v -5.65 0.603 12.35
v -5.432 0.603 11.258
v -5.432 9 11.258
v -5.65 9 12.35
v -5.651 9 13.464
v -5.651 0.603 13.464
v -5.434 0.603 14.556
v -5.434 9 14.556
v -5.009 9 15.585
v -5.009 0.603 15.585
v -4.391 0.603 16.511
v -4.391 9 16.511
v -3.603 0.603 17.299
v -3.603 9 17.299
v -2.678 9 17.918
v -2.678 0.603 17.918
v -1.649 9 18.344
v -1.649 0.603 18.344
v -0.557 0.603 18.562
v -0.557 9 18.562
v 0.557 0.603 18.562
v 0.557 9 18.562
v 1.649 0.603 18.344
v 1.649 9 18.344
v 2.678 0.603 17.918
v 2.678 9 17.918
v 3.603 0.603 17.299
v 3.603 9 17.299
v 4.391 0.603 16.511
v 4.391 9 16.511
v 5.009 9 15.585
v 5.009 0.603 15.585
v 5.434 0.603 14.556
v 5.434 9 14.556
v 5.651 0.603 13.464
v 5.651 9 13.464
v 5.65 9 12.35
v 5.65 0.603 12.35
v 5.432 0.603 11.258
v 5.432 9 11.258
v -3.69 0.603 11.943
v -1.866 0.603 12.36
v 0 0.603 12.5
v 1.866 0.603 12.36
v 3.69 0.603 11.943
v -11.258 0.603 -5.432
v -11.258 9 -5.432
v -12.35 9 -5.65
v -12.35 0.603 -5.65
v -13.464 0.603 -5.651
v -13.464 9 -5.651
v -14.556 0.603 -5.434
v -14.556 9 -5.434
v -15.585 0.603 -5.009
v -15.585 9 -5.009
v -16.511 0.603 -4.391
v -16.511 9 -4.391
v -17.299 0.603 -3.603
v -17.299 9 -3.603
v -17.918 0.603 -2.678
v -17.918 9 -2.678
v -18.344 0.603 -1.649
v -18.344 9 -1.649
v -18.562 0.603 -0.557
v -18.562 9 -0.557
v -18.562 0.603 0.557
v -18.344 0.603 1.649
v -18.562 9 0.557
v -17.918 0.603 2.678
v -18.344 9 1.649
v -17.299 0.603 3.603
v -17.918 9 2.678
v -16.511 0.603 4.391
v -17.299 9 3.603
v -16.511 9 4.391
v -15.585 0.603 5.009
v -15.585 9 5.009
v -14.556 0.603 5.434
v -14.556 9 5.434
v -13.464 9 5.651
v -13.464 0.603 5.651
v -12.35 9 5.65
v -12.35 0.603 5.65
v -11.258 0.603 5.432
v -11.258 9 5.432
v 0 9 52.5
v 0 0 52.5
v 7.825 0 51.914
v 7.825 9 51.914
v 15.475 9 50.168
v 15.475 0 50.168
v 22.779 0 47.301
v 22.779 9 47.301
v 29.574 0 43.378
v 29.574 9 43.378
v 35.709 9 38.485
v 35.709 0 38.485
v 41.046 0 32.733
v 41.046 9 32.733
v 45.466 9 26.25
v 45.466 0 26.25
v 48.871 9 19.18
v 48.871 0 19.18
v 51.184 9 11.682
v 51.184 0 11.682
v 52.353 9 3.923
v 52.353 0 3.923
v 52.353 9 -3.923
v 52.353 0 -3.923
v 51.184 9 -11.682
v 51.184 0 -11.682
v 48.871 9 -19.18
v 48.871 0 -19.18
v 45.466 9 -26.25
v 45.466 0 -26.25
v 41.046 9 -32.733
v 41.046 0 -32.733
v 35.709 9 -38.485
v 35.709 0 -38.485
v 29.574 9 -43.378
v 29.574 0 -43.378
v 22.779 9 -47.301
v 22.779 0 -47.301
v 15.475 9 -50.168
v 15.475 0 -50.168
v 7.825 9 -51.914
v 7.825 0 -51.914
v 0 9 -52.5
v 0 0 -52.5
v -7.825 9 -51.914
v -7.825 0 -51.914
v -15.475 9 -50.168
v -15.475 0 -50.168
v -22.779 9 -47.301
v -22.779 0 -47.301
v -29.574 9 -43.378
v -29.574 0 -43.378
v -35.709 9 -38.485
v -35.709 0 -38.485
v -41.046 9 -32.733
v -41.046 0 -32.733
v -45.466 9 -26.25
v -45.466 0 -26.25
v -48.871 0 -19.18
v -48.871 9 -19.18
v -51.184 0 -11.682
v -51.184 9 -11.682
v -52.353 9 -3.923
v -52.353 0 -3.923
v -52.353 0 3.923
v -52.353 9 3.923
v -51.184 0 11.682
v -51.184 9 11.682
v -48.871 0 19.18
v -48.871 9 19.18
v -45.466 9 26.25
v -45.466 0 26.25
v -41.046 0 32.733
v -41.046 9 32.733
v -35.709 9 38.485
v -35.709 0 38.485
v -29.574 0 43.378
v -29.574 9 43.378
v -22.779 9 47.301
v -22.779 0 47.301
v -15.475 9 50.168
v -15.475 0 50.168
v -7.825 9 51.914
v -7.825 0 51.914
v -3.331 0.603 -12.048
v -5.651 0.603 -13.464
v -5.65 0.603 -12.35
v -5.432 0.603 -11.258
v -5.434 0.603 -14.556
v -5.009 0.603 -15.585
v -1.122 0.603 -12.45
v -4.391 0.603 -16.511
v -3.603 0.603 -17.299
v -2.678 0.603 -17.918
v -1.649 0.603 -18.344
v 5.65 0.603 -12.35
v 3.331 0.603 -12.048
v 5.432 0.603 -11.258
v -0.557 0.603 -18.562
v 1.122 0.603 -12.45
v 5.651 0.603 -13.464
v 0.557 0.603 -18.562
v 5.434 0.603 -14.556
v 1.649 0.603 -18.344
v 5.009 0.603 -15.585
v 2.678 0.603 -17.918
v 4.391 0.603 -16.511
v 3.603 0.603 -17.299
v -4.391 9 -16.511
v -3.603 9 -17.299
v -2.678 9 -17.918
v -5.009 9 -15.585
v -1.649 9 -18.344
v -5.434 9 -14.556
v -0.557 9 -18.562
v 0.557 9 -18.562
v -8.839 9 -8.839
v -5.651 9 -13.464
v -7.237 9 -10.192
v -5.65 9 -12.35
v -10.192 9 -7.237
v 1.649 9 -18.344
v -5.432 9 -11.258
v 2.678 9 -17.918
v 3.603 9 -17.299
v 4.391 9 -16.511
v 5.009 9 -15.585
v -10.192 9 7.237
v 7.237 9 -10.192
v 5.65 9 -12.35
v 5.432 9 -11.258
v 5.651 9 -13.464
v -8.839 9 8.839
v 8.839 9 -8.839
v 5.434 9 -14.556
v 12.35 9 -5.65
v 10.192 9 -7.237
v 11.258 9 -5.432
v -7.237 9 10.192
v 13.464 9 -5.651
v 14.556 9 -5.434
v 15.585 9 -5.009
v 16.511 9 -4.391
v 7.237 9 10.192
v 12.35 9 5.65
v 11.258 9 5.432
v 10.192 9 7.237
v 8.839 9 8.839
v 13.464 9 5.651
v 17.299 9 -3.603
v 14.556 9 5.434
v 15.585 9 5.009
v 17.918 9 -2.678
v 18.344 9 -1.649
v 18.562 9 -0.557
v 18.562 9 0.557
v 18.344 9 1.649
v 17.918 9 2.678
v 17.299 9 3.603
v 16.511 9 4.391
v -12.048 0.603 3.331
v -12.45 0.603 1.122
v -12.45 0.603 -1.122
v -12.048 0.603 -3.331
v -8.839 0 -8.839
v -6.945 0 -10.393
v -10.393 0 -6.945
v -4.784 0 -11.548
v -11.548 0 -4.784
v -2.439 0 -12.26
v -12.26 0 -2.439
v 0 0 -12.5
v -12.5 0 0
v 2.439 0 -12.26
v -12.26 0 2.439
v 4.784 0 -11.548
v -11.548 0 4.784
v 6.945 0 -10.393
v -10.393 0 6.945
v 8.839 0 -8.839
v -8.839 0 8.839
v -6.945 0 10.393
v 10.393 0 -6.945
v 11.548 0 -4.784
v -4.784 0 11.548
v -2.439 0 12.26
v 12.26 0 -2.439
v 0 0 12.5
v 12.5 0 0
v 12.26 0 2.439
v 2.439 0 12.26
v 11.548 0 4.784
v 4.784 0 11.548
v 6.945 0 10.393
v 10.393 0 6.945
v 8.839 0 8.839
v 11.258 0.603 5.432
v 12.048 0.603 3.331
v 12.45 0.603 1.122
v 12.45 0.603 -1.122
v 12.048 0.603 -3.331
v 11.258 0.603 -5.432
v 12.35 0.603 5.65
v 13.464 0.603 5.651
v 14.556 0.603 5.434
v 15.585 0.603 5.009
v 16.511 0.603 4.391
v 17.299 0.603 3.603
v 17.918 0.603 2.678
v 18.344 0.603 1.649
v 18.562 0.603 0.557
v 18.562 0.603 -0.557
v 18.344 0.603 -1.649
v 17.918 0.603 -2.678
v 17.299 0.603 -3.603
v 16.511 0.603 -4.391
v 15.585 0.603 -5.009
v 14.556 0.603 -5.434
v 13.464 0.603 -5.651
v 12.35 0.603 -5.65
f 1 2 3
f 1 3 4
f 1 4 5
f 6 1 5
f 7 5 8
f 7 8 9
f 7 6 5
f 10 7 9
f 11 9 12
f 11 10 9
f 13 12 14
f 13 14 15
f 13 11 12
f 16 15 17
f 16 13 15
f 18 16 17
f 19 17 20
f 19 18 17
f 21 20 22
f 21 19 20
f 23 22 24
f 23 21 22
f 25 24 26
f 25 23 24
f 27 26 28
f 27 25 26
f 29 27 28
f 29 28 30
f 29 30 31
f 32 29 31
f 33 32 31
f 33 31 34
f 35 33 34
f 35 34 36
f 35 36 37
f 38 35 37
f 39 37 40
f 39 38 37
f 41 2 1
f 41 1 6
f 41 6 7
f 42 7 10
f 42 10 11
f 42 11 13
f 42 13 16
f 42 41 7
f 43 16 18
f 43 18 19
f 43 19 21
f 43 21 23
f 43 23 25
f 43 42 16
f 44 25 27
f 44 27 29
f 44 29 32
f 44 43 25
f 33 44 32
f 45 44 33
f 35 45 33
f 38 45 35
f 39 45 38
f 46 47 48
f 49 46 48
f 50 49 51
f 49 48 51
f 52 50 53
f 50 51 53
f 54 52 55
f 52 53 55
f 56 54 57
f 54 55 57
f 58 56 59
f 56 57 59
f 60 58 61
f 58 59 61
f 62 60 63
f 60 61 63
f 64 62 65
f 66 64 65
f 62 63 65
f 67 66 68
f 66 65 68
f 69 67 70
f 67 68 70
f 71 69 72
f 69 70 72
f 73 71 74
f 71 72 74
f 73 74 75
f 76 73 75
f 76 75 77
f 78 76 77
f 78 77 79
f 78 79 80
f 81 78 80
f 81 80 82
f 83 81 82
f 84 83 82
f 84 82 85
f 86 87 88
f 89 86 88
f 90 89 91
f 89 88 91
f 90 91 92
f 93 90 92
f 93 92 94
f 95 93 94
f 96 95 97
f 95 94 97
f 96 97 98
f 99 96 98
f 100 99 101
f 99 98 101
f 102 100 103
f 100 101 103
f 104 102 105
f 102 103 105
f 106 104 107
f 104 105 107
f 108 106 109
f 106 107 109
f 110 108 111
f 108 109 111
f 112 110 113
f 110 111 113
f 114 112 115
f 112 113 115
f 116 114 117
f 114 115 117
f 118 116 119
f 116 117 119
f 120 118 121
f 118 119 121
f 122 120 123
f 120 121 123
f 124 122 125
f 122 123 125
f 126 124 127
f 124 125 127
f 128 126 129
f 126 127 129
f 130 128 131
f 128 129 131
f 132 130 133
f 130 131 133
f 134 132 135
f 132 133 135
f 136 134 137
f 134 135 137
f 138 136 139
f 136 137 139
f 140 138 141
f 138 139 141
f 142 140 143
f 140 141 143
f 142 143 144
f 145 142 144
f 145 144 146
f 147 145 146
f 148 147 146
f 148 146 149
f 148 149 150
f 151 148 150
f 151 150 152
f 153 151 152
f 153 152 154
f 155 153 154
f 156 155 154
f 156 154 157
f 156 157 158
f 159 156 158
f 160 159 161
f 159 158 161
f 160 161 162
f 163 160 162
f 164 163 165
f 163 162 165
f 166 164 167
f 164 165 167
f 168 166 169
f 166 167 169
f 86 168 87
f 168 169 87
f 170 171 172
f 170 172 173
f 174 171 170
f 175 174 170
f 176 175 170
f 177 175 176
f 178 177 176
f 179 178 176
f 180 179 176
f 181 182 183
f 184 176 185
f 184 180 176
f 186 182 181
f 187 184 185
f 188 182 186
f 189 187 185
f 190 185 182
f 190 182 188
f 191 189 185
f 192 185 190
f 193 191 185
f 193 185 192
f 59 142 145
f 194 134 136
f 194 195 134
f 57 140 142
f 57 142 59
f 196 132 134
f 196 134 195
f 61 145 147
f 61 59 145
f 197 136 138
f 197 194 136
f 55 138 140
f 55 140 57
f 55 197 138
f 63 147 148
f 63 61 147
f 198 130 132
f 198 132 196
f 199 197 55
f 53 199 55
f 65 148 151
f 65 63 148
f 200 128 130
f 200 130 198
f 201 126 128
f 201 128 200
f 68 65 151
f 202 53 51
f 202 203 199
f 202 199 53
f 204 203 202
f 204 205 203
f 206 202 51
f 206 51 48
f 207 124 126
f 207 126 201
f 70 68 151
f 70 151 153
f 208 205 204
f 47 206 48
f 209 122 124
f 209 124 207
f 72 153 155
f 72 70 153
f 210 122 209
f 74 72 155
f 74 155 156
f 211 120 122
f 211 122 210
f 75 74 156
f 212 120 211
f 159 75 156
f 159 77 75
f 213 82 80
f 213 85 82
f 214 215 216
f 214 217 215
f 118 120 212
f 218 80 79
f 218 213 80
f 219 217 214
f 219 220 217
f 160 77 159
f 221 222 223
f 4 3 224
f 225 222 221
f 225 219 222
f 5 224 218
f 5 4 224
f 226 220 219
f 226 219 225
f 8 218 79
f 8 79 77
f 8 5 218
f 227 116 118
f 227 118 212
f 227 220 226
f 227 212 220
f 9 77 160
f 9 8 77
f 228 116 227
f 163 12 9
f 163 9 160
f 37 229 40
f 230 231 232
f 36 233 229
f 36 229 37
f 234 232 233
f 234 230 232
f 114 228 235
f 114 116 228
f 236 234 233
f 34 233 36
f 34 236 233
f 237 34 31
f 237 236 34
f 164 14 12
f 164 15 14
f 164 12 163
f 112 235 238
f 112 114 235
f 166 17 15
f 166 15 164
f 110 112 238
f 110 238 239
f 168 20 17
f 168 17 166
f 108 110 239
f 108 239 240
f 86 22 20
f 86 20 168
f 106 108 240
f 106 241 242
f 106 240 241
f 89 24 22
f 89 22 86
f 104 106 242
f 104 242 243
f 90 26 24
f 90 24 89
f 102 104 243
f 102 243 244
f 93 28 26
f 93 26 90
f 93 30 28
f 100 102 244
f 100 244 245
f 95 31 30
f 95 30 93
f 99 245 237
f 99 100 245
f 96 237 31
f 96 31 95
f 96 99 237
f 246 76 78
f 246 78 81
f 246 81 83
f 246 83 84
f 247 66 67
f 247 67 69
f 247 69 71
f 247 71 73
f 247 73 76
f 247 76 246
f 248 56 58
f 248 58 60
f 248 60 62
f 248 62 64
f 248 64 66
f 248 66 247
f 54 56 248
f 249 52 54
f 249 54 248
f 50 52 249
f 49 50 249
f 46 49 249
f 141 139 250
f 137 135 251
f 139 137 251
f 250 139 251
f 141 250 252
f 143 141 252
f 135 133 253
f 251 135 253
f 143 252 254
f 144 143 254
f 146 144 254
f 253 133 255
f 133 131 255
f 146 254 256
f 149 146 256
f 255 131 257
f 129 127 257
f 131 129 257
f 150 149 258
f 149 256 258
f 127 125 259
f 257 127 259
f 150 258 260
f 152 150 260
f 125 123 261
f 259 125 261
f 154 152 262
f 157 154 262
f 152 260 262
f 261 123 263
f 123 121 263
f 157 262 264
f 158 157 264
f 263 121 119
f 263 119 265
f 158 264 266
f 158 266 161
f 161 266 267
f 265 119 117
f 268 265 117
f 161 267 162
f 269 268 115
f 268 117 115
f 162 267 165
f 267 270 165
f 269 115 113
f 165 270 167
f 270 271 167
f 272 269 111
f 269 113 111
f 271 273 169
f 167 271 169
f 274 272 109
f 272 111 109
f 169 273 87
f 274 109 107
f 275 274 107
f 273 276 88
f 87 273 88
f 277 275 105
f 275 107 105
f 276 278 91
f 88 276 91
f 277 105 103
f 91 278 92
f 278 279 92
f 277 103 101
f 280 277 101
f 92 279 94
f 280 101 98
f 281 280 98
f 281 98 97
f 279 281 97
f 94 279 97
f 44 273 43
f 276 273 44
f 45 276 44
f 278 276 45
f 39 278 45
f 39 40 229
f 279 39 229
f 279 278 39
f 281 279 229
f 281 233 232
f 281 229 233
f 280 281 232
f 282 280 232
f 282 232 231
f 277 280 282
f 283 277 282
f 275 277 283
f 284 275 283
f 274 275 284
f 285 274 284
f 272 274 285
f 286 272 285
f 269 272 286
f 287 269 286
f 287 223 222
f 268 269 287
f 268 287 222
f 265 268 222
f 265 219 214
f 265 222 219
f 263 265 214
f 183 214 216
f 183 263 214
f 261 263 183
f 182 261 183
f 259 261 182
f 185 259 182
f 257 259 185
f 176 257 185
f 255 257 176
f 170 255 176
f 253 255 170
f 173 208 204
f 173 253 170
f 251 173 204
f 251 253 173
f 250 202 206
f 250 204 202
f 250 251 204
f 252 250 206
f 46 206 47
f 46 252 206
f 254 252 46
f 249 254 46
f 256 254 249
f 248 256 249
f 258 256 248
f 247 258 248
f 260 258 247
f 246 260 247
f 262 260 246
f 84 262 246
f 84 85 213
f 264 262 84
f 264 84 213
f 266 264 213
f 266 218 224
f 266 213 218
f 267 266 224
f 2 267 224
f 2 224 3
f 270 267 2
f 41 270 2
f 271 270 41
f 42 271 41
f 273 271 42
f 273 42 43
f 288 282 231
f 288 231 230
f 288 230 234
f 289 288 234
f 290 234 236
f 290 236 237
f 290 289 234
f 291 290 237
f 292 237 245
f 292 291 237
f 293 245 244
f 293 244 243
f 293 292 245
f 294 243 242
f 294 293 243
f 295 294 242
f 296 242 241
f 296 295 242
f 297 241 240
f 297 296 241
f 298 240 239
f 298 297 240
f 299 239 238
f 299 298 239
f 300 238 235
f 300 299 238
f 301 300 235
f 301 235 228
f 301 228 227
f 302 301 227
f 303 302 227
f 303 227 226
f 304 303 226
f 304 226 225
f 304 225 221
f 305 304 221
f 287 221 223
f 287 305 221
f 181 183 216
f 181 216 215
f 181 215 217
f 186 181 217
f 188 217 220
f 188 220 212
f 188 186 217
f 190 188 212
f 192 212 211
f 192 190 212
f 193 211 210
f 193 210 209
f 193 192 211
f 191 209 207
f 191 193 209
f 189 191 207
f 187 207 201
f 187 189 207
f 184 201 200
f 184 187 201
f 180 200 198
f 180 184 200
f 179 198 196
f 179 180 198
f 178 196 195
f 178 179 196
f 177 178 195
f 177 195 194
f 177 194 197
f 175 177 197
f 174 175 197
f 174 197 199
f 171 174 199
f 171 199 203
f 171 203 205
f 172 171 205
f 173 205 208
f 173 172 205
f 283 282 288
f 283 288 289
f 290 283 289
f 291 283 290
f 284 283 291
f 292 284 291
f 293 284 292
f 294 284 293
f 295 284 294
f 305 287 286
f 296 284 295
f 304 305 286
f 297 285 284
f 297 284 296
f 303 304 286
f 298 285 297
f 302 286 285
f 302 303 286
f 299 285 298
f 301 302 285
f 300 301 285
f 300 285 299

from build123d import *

# Parameters (mm, degrees)
SKETCH1_R           = 52.5
BOSS_EXTRUDE1_DEPTH = 9
SKETCH2_R           = 12.5
CUT_EXTRUDE1_DEPTH  = 75.789705174
SKETCH3_R           = 5.677743223
CUT_EXTRUDE2_DEPTH  = 8.396653789
CIRPATTERN1_COUNT   = 4


with BuildPart() as part:
    # Sketch1 → Boss-Extrude1 (new body)
    with BuildSketch(Plane(origin=(0, 0, 0), x_dir=(1, 0, 0), z_dir=(0, 1, 0))):
        Circle(SKETCH1_R)
    extrude(amount=BOSS_EXTRUDE1_DEPTH)

    # Sketch2 → Cut-Extrude1 (cut, through all)
    with BuildSketch(Plane(origin=(0, 0, 0), x_dir=(1, 0, 0), z_dir=(0, 1, 0))):
        Circle(SKETCH2_R)
    extrude(amount=CUT_EXTRUDE1_DEPTH, mode=Mode.SUBTRACT)

    # Sketch3 → Cut-Extrude2 (cut)
    with BuildSketch(Plane(origin=(0, 9, 0), x_dir=(1, 0, 0), z_dir=(0, 1, 0))):
        with Locations((-12.911355312, 0)):
            Circle(SKETCH3_R)
    cut_extrude2 = extrude(amount=-CUT_EXTRUDE2_DEPTH, mode=Mode.SUBTRACT)

    # CirPattern1: Cut-Extrude2 ×4 about axis
    cirpattern1_axis = Axis((0, 0, 0), (0, 1, 0))
    for i in range(1, CIRPATTERN1_COUNT):
        add(cut_extrude2.rotate(cirpattern1_axis, i * 360 / CIRPATTERN1_COUNT), mode=Mode.SUBTRACT)


solid = part.part
